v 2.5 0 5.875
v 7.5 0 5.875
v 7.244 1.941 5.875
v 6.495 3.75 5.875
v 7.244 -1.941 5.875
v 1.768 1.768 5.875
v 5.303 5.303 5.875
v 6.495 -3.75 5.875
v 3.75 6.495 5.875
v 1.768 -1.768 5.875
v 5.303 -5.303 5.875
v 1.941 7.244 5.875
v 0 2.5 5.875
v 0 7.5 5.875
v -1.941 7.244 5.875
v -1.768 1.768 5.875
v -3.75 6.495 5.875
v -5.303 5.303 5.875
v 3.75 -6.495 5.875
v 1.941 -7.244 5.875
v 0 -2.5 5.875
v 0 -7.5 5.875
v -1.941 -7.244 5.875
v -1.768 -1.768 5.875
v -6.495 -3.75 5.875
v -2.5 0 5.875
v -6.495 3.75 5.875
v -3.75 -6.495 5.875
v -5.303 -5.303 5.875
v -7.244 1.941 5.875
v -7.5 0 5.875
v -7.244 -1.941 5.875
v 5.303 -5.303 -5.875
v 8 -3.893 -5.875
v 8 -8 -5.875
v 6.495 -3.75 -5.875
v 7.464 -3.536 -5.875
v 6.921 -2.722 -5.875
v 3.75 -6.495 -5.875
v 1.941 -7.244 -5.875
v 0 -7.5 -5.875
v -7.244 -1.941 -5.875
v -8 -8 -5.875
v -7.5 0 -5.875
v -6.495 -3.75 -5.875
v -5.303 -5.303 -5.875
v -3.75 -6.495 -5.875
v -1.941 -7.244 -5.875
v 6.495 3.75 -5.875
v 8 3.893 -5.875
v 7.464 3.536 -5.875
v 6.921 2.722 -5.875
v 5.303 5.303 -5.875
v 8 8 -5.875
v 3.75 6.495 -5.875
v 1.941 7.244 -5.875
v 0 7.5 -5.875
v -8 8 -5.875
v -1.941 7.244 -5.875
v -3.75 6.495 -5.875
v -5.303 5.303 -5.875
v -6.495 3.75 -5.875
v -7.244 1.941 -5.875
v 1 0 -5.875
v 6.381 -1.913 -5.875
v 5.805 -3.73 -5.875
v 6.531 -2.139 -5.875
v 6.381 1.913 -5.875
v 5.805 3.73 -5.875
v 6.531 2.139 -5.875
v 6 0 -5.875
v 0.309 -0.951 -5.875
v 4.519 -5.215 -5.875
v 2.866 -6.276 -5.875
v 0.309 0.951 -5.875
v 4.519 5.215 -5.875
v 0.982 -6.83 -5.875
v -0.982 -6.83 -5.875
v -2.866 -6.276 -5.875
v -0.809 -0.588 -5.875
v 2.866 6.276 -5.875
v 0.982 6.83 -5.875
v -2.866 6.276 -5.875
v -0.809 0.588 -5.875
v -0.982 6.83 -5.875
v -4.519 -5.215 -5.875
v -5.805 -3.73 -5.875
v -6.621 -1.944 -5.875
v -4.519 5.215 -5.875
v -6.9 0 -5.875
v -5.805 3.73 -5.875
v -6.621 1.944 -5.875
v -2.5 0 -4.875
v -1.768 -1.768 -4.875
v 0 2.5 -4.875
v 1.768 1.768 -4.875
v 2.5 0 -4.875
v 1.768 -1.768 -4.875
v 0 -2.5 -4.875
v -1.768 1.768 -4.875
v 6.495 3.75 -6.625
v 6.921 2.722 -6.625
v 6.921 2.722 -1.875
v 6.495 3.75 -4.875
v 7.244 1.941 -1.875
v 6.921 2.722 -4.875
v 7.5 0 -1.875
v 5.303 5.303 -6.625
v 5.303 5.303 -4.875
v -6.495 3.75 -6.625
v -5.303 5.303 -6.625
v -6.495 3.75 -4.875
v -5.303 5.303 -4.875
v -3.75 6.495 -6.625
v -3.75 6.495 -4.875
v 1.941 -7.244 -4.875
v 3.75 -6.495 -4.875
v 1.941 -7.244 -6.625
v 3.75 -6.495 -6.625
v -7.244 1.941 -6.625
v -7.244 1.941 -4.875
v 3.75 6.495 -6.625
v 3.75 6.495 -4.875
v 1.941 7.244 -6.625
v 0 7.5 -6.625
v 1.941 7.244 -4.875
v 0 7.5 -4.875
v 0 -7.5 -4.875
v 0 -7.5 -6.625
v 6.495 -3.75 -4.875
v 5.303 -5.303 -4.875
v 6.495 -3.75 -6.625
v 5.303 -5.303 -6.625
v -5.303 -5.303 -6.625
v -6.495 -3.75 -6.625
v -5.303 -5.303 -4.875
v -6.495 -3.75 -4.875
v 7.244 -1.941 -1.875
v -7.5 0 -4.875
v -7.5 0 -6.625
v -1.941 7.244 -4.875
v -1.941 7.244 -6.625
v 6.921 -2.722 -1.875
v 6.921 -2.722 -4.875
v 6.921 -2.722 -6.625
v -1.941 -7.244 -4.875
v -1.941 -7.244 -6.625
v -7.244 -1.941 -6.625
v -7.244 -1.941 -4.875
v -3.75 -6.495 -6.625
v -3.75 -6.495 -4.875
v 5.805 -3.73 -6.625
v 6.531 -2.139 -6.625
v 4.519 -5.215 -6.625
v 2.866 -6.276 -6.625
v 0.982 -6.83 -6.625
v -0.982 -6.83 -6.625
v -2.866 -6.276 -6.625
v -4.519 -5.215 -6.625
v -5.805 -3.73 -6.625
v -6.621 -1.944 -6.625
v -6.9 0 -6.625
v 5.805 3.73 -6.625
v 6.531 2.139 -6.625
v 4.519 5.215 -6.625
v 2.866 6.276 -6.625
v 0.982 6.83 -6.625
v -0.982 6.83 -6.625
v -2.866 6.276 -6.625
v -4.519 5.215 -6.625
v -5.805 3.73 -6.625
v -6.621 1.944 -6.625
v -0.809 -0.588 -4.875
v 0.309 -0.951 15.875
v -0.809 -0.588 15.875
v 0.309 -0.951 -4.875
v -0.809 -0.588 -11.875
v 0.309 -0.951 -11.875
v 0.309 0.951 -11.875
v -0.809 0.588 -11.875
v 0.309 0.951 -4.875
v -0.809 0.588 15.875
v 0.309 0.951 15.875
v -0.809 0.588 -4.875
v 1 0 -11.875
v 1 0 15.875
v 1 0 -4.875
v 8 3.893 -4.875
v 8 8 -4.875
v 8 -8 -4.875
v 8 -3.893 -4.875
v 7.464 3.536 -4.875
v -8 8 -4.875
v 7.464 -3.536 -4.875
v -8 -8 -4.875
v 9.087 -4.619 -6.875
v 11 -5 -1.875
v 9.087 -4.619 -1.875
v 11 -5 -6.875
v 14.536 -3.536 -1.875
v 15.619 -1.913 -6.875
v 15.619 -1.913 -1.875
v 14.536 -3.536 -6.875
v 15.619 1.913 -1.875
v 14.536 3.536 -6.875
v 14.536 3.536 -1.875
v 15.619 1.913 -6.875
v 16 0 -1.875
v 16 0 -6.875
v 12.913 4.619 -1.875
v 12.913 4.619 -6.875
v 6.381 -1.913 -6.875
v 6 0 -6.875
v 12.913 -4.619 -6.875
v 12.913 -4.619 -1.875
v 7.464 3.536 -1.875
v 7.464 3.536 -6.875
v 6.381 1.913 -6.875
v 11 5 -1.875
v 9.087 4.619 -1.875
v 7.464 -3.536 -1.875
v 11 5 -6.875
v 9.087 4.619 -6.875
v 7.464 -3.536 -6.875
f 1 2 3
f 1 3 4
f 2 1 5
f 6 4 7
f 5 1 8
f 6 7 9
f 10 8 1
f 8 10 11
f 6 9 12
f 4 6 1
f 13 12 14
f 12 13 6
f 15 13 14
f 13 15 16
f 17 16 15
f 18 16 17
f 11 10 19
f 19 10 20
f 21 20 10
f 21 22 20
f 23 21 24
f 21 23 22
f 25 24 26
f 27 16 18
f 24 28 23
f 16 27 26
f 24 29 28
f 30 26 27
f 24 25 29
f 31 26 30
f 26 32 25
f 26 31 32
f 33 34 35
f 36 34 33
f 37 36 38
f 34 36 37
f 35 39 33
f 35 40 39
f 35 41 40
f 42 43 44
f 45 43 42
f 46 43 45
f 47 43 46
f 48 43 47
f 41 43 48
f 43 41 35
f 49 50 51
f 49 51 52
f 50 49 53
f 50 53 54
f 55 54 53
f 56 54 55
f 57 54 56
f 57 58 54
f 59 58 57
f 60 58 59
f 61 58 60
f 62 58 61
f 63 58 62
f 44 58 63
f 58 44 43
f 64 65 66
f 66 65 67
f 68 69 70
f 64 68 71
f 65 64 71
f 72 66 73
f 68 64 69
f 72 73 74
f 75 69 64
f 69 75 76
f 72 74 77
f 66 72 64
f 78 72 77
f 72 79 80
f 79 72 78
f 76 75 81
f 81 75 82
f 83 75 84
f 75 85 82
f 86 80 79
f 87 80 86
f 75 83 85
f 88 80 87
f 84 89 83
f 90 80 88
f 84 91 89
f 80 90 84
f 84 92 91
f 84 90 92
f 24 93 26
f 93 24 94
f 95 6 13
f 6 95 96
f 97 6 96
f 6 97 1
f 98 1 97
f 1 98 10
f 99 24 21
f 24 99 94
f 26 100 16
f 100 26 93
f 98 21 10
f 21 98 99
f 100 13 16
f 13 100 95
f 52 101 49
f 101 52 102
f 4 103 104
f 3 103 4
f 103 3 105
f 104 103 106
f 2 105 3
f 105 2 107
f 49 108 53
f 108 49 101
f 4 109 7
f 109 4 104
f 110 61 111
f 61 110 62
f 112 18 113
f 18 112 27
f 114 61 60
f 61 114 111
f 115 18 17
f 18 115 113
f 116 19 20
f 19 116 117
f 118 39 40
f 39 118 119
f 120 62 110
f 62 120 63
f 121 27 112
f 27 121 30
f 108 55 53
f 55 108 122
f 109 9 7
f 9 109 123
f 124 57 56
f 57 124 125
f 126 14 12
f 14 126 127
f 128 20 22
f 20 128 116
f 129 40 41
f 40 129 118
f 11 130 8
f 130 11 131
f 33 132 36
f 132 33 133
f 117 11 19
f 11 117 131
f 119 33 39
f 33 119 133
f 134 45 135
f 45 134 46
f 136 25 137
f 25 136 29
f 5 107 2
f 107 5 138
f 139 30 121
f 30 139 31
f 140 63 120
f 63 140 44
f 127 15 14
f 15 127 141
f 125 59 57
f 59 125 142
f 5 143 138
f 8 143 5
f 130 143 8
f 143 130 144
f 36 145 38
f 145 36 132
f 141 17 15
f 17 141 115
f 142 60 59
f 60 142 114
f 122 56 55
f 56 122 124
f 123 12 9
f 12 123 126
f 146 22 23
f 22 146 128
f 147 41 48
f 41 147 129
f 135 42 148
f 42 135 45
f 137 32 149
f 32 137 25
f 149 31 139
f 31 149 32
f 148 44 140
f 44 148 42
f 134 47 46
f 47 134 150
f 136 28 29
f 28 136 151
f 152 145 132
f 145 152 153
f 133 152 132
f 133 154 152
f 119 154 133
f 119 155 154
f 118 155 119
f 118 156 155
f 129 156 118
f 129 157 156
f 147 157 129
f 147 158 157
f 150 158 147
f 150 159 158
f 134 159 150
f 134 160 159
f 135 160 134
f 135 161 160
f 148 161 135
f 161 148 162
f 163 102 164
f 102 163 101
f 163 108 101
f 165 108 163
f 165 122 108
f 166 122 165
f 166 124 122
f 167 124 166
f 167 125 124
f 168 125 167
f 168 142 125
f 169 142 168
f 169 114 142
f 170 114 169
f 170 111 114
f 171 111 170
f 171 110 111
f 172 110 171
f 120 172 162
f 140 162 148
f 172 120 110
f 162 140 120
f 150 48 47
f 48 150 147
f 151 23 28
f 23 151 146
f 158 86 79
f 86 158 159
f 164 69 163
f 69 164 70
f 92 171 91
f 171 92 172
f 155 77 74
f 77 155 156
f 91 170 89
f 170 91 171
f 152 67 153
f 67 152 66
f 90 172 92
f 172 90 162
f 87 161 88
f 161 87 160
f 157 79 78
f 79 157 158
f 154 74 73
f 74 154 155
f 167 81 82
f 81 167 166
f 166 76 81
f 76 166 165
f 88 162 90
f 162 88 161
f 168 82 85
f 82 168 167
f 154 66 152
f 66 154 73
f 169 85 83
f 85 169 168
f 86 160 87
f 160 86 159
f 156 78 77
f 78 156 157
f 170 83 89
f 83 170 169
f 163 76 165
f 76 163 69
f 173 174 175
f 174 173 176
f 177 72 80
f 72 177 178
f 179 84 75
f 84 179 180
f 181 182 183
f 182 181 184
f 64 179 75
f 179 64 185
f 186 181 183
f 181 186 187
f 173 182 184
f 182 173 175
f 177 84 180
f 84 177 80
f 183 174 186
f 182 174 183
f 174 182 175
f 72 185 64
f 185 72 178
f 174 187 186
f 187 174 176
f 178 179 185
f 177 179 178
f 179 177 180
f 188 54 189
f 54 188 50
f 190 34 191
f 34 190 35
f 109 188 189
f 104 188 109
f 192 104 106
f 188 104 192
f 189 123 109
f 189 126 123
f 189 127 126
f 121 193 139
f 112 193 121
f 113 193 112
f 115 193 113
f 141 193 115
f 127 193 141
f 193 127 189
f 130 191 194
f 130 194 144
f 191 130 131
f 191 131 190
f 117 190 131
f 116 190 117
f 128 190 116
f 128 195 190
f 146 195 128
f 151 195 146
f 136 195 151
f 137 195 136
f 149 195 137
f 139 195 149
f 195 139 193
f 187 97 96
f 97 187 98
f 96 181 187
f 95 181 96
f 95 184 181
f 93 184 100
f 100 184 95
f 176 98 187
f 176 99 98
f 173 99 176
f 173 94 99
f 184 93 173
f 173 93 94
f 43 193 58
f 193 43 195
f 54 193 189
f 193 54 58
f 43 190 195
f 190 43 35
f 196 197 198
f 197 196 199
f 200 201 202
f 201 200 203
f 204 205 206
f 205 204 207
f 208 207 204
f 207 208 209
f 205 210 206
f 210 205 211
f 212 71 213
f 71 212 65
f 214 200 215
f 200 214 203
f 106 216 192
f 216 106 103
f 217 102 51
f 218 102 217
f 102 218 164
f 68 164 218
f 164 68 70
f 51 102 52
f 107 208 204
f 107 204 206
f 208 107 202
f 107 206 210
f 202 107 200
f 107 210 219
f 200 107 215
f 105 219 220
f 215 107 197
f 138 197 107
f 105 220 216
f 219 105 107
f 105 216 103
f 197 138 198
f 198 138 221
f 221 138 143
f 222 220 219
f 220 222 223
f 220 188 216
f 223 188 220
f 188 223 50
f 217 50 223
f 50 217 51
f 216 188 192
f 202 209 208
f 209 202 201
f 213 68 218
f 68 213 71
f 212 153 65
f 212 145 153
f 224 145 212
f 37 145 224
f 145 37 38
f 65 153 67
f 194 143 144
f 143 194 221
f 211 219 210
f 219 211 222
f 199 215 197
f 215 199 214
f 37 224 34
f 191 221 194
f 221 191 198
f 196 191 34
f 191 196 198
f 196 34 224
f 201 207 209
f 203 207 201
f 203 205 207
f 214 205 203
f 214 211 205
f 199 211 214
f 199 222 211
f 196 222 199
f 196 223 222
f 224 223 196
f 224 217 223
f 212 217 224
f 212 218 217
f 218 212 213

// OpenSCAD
// Parameters
stator_diameter = 14.0; //[7.0:28.0:0.1]
stator_height = 11.75; //[5.875:23.5:0.05]
stator_bore_diameter = 5.0; //[2.5:10.0:0.1]
rotor_outer_diameter = 15.0; //[7.5:30.0:0.1]
rotor_height = 12.5; //[6.25:25.0:0.05]
air_gap_radial = 0.25; //[0.1:0.8:0.05]
shaft_diameter = 2.0; //[1.0:4.0:0.05]
shaft_length_above = 10.0; //[5.0:20.0:0.5]
shaft_length_below = 5.0; //[2.5:10.0:0.5]
base_face_thickness = 1.0; //[0.5:2.0:0.1]
overlap = 1.0; //[0.5:2.0:0.1]
rotor_can_wall = 0.6; //[0.3:1.2:0.05]
buzzer_diameter = 10.0; //[5.0:20.0:0.5]
buzzer_height = 5.0; //[2.5:10.0:0.5]
buzzer_pin_diameter = 2.0; //[1.0:3.0:0.1]
buzzer_pin_height = 2.0; //[0.5:5.0:0.1]

// Buzzer - complete geometry
module buzzer() {
  color([0.85, 0.85, 0.8]) {
    // Buzzer body
    translate([stator_diameter/2 + buzzer_diameter/2 - overlap, 0, -stator_height/2 - base_face_thickness + buzzer_height/2])
      cylinder(r=buzzer_diameter/2, h=buzzer_height, center=true);
    // Buzzer pin
    translate([stator_diameter/2 + buzzer_diameter/2 - overlap, 0, -stator_height/2 - base_face_thickness + buzzer_height/2 + buzzer_pin_height/2 - overlap])
      cylinder(r=buzzer_pin_diameter/2, h=buzzer_pin_height, center=true);
  }
}

// Motor assembly
module assembly() {
  color("DimGray") {
    // Stator core
    difference() {
      translate([0, 0, 0])
        cylinder(r=stator_diameter/2, h=stator_height, center=true);
      translate([0, 0, 0])
        cylinder(r=stator_bore_diameter/2, h=stator_height + 2*overlap, center=true);
    }
    // Rotor can
    translate([0, 0, (stator_height - rotor_height)/2])
      difference() {
        cylinder(r=rotor_outer_diameter/2, h=rotor_height, center=true);
        cylinder(r=rotor_outer_diameter/2 - rotor_can_wall, h=rotor_height + 2*overlap, center=true);
      }
    // Central shaft
    translate([0, 0, (shaft_length_above - shaft_length_below - base_face_thickness)/2])
      cylinder(r=shaft_diameter/2, h=shaft_length_above + stator_height + base_face_thickness + shaft_length_below, center=true);
    // Mounting base face
    translate([0, 0, -stator_height/2 - base_face_thickness/2 + overlap])
      cube([stator_diameter + 2*base_face_thickness, stator_diameter + 2*base_face_thickness, base_face_thickness], center=true);
  }
  // Buzzer
  buzzer();
}

// Final assembly
assembly();
